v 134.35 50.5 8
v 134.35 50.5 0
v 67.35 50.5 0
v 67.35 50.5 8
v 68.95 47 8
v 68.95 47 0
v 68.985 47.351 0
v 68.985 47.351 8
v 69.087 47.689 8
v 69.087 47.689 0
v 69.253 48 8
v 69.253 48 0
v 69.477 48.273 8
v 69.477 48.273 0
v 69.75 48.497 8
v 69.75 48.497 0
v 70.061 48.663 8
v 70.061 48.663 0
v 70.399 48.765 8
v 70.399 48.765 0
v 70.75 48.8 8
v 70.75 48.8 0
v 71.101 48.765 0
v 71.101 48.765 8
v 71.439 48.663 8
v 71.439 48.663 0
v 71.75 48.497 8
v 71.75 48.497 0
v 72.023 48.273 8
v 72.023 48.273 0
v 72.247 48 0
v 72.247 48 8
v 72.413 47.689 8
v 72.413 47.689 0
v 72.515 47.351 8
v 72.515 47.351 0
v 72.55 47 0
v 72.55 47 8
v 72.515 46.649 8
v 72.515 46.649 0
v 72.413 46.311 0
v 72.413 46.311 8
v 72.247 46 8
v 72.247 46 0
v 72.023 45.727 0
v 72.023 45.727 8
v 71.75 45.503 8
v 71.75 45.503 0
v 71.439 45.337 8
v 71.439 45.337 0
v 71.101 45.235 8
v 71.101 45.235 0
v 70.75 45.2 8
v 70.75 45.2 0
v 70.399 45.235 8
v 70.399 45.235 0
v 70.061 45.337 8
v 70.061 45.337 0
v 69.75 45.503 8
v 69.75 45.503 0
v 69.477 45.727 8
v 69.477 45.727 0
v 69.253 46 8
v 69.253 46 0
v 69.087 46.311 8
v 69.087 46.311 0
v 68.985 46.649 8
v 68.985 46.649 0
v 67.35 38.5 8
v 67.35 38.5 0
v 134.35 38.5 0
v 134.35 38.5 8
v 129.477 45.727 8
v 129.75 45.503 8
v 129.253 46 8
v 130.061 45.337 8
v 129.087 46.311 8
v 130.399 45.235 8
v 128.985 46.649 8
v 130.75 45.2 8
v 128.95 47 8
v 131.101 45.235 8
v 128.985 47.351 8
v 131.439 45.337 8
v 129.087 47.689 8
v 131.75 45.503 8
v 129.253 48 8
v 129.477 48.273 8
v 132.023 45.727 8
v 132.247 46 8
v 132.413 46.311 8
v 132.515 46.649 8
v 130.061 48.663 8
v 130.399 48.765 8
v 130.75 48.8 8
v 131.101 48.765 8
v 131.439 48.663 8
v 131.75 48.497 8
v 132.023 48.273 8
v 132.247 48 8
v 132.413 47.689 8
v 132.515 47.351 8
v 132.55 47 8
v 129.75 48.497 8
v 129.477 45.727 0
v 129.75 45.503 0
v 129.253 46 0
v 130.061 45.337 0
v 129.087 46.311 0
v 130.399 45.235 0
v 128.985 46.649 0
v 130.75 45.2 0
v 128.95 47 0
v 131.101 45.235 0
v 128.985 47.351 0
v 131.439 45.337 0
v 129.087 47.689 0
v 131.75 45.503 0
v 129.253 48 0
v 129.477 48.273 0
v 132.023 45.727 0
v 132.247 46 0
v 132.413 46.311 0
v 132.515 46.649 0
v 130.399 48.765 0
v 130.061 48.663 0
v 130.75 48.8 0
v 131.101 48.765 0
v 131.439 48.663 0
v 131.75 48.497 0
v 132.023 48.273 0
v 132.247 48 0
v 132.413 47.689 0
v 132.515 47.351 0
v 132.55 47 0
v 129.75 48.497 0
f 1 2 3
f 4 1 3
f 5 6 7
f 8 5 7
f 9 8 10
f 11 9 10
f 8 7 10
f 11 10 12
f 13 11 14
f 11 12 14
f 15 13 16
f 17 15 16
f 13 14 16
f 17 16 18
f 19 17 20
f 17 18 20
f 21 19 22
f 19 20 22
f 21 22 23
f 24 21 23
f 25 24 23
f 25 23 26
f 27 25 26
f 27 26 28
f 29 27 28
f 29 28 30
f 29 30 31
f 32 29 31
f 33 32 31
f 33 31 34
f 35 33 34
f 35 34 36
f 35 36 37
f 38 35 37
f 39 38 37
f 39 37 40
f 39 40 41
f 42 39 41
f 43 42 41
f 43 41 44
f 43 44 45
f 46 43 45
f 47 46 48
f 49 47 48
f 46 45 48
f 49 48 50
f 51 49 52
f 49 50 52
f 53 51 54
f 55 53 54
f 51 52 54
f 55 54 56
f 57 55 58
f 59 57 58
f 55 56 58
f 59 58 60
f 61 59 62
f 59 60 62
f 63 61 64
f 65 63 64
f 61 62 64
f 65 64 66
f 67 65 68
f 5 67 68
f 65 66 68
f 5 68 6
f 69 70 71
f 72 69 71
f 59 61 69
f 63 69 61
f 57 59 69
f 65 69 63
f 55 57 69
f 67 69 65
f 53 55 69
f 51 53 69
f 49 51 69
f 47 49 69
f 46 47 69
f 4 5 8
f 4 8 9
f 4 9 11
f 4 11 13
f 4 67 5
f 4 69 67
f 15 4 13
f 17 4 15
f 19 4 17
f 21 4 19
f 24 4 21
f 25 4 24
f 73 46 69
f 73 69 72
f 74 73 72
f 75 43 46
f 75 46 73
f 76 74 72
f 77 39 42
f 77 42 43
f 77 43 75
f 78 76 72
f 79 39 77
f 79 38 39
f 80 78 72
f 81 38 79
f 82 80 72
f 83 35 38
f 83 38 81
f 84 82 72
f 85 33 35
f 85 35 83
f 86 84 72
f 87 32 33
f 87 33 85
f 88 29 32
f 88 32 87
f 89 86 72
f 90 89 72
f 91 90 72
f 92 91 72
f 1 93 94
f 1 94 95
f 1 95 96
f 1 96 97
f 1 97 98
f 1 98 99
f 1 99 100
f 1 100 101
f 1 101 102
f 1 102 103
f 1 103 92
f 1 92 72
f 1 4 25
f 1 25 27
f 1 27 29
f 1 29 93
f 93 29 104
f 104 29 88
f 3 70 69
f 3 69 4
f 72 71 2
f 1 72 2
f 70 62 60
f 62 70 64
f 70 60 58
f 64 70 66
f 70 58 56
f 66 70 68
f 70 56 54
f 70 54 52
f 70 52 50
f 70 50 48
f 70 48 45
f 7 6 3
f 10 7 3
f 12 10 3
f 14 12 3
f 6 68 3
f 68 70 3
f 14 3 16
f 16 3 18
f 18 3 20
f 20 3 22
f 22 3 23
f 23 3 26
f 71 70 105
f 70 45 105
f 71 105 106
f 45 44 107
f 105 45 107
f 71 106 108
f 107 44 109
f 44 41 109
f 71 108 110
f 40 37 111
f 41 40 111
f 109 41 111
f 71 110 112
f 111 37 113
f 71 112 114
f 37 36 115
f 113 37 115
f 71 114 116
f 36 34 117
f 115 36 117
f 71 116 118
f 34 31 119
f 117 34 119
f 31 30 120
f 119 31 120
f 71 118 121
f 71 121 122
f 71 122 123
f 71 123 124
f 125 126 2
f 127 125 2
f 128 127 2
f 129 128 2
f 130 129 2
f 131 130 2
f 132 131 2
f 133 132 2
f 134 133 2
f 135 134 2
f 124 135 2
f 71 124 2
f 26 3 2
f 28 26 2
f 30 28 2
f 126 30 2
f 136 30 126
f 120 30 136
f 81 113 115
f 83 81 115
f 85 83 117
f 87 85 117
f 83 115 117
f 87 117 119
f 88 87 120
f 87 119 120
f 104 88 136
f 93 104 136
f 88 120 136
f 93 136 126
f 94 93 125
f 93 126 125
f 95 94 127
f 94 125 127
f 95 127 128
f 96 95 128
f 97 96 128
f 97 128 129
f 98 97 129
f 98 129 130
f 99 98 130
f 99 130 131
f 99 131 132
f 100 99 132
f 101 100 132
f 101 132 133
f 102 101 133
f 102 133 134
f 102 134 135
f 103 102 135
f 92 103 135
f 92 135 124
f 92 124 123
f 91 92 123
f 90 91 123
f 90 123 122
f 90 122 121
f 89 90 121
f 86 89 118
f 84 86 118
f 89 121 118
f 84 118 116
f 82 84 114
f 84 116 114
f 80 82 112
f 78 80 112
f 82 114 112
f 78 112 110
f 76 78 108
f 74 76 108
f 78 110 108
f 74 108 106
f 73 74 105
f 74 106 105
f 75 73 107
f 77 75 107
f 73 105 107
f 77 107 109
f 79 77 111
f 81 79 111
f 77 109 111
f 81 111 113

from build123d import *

# Parameters (mm, degrees)
SKETCH2_W            = 13.3
SKETCH2_H            = 12
SKETCH2_W_2          = 40.4
BOSS_EXTRUDE1_DEPTH  = 8.000000075
M3_CLEARANCE_HOLE1_D = 3.6


with BuildPart() as part:
    # Sketch2 → Boss-Extrude1 (new body)
    with BuildSketch(Plane.XY):
        with Locations((74.00000003, 44.5)):
            Rectangle(SKETCH2_W, SKETCH2_H)
        with Locations((100.85000003, 44.5)):
            Rectangle(SKETCH2_W_2, SKETCH2_H)
        with Locations((127.70000003, 44.5)):
            Rectangle(SKETCH2_W, SKETCH2_H)
    extrude(amount=BOSS_EXTRUDE1_DEPTH)

    # M3 Clearance Hole1 (through all)
    with Locations(Plane(origin=(2.6e-08, 0, 8.00000029), x_dir=(1.0, 0, -3.199998676446638e-09), z_dir=(3.199998676446638e-09, 0, 1.0))):
        with Locations((70.750000016, 47), (130.750000016, 47)):
            Hole(M3_CLEARANCE_HOLE1_D / 2)


solid = part.part
